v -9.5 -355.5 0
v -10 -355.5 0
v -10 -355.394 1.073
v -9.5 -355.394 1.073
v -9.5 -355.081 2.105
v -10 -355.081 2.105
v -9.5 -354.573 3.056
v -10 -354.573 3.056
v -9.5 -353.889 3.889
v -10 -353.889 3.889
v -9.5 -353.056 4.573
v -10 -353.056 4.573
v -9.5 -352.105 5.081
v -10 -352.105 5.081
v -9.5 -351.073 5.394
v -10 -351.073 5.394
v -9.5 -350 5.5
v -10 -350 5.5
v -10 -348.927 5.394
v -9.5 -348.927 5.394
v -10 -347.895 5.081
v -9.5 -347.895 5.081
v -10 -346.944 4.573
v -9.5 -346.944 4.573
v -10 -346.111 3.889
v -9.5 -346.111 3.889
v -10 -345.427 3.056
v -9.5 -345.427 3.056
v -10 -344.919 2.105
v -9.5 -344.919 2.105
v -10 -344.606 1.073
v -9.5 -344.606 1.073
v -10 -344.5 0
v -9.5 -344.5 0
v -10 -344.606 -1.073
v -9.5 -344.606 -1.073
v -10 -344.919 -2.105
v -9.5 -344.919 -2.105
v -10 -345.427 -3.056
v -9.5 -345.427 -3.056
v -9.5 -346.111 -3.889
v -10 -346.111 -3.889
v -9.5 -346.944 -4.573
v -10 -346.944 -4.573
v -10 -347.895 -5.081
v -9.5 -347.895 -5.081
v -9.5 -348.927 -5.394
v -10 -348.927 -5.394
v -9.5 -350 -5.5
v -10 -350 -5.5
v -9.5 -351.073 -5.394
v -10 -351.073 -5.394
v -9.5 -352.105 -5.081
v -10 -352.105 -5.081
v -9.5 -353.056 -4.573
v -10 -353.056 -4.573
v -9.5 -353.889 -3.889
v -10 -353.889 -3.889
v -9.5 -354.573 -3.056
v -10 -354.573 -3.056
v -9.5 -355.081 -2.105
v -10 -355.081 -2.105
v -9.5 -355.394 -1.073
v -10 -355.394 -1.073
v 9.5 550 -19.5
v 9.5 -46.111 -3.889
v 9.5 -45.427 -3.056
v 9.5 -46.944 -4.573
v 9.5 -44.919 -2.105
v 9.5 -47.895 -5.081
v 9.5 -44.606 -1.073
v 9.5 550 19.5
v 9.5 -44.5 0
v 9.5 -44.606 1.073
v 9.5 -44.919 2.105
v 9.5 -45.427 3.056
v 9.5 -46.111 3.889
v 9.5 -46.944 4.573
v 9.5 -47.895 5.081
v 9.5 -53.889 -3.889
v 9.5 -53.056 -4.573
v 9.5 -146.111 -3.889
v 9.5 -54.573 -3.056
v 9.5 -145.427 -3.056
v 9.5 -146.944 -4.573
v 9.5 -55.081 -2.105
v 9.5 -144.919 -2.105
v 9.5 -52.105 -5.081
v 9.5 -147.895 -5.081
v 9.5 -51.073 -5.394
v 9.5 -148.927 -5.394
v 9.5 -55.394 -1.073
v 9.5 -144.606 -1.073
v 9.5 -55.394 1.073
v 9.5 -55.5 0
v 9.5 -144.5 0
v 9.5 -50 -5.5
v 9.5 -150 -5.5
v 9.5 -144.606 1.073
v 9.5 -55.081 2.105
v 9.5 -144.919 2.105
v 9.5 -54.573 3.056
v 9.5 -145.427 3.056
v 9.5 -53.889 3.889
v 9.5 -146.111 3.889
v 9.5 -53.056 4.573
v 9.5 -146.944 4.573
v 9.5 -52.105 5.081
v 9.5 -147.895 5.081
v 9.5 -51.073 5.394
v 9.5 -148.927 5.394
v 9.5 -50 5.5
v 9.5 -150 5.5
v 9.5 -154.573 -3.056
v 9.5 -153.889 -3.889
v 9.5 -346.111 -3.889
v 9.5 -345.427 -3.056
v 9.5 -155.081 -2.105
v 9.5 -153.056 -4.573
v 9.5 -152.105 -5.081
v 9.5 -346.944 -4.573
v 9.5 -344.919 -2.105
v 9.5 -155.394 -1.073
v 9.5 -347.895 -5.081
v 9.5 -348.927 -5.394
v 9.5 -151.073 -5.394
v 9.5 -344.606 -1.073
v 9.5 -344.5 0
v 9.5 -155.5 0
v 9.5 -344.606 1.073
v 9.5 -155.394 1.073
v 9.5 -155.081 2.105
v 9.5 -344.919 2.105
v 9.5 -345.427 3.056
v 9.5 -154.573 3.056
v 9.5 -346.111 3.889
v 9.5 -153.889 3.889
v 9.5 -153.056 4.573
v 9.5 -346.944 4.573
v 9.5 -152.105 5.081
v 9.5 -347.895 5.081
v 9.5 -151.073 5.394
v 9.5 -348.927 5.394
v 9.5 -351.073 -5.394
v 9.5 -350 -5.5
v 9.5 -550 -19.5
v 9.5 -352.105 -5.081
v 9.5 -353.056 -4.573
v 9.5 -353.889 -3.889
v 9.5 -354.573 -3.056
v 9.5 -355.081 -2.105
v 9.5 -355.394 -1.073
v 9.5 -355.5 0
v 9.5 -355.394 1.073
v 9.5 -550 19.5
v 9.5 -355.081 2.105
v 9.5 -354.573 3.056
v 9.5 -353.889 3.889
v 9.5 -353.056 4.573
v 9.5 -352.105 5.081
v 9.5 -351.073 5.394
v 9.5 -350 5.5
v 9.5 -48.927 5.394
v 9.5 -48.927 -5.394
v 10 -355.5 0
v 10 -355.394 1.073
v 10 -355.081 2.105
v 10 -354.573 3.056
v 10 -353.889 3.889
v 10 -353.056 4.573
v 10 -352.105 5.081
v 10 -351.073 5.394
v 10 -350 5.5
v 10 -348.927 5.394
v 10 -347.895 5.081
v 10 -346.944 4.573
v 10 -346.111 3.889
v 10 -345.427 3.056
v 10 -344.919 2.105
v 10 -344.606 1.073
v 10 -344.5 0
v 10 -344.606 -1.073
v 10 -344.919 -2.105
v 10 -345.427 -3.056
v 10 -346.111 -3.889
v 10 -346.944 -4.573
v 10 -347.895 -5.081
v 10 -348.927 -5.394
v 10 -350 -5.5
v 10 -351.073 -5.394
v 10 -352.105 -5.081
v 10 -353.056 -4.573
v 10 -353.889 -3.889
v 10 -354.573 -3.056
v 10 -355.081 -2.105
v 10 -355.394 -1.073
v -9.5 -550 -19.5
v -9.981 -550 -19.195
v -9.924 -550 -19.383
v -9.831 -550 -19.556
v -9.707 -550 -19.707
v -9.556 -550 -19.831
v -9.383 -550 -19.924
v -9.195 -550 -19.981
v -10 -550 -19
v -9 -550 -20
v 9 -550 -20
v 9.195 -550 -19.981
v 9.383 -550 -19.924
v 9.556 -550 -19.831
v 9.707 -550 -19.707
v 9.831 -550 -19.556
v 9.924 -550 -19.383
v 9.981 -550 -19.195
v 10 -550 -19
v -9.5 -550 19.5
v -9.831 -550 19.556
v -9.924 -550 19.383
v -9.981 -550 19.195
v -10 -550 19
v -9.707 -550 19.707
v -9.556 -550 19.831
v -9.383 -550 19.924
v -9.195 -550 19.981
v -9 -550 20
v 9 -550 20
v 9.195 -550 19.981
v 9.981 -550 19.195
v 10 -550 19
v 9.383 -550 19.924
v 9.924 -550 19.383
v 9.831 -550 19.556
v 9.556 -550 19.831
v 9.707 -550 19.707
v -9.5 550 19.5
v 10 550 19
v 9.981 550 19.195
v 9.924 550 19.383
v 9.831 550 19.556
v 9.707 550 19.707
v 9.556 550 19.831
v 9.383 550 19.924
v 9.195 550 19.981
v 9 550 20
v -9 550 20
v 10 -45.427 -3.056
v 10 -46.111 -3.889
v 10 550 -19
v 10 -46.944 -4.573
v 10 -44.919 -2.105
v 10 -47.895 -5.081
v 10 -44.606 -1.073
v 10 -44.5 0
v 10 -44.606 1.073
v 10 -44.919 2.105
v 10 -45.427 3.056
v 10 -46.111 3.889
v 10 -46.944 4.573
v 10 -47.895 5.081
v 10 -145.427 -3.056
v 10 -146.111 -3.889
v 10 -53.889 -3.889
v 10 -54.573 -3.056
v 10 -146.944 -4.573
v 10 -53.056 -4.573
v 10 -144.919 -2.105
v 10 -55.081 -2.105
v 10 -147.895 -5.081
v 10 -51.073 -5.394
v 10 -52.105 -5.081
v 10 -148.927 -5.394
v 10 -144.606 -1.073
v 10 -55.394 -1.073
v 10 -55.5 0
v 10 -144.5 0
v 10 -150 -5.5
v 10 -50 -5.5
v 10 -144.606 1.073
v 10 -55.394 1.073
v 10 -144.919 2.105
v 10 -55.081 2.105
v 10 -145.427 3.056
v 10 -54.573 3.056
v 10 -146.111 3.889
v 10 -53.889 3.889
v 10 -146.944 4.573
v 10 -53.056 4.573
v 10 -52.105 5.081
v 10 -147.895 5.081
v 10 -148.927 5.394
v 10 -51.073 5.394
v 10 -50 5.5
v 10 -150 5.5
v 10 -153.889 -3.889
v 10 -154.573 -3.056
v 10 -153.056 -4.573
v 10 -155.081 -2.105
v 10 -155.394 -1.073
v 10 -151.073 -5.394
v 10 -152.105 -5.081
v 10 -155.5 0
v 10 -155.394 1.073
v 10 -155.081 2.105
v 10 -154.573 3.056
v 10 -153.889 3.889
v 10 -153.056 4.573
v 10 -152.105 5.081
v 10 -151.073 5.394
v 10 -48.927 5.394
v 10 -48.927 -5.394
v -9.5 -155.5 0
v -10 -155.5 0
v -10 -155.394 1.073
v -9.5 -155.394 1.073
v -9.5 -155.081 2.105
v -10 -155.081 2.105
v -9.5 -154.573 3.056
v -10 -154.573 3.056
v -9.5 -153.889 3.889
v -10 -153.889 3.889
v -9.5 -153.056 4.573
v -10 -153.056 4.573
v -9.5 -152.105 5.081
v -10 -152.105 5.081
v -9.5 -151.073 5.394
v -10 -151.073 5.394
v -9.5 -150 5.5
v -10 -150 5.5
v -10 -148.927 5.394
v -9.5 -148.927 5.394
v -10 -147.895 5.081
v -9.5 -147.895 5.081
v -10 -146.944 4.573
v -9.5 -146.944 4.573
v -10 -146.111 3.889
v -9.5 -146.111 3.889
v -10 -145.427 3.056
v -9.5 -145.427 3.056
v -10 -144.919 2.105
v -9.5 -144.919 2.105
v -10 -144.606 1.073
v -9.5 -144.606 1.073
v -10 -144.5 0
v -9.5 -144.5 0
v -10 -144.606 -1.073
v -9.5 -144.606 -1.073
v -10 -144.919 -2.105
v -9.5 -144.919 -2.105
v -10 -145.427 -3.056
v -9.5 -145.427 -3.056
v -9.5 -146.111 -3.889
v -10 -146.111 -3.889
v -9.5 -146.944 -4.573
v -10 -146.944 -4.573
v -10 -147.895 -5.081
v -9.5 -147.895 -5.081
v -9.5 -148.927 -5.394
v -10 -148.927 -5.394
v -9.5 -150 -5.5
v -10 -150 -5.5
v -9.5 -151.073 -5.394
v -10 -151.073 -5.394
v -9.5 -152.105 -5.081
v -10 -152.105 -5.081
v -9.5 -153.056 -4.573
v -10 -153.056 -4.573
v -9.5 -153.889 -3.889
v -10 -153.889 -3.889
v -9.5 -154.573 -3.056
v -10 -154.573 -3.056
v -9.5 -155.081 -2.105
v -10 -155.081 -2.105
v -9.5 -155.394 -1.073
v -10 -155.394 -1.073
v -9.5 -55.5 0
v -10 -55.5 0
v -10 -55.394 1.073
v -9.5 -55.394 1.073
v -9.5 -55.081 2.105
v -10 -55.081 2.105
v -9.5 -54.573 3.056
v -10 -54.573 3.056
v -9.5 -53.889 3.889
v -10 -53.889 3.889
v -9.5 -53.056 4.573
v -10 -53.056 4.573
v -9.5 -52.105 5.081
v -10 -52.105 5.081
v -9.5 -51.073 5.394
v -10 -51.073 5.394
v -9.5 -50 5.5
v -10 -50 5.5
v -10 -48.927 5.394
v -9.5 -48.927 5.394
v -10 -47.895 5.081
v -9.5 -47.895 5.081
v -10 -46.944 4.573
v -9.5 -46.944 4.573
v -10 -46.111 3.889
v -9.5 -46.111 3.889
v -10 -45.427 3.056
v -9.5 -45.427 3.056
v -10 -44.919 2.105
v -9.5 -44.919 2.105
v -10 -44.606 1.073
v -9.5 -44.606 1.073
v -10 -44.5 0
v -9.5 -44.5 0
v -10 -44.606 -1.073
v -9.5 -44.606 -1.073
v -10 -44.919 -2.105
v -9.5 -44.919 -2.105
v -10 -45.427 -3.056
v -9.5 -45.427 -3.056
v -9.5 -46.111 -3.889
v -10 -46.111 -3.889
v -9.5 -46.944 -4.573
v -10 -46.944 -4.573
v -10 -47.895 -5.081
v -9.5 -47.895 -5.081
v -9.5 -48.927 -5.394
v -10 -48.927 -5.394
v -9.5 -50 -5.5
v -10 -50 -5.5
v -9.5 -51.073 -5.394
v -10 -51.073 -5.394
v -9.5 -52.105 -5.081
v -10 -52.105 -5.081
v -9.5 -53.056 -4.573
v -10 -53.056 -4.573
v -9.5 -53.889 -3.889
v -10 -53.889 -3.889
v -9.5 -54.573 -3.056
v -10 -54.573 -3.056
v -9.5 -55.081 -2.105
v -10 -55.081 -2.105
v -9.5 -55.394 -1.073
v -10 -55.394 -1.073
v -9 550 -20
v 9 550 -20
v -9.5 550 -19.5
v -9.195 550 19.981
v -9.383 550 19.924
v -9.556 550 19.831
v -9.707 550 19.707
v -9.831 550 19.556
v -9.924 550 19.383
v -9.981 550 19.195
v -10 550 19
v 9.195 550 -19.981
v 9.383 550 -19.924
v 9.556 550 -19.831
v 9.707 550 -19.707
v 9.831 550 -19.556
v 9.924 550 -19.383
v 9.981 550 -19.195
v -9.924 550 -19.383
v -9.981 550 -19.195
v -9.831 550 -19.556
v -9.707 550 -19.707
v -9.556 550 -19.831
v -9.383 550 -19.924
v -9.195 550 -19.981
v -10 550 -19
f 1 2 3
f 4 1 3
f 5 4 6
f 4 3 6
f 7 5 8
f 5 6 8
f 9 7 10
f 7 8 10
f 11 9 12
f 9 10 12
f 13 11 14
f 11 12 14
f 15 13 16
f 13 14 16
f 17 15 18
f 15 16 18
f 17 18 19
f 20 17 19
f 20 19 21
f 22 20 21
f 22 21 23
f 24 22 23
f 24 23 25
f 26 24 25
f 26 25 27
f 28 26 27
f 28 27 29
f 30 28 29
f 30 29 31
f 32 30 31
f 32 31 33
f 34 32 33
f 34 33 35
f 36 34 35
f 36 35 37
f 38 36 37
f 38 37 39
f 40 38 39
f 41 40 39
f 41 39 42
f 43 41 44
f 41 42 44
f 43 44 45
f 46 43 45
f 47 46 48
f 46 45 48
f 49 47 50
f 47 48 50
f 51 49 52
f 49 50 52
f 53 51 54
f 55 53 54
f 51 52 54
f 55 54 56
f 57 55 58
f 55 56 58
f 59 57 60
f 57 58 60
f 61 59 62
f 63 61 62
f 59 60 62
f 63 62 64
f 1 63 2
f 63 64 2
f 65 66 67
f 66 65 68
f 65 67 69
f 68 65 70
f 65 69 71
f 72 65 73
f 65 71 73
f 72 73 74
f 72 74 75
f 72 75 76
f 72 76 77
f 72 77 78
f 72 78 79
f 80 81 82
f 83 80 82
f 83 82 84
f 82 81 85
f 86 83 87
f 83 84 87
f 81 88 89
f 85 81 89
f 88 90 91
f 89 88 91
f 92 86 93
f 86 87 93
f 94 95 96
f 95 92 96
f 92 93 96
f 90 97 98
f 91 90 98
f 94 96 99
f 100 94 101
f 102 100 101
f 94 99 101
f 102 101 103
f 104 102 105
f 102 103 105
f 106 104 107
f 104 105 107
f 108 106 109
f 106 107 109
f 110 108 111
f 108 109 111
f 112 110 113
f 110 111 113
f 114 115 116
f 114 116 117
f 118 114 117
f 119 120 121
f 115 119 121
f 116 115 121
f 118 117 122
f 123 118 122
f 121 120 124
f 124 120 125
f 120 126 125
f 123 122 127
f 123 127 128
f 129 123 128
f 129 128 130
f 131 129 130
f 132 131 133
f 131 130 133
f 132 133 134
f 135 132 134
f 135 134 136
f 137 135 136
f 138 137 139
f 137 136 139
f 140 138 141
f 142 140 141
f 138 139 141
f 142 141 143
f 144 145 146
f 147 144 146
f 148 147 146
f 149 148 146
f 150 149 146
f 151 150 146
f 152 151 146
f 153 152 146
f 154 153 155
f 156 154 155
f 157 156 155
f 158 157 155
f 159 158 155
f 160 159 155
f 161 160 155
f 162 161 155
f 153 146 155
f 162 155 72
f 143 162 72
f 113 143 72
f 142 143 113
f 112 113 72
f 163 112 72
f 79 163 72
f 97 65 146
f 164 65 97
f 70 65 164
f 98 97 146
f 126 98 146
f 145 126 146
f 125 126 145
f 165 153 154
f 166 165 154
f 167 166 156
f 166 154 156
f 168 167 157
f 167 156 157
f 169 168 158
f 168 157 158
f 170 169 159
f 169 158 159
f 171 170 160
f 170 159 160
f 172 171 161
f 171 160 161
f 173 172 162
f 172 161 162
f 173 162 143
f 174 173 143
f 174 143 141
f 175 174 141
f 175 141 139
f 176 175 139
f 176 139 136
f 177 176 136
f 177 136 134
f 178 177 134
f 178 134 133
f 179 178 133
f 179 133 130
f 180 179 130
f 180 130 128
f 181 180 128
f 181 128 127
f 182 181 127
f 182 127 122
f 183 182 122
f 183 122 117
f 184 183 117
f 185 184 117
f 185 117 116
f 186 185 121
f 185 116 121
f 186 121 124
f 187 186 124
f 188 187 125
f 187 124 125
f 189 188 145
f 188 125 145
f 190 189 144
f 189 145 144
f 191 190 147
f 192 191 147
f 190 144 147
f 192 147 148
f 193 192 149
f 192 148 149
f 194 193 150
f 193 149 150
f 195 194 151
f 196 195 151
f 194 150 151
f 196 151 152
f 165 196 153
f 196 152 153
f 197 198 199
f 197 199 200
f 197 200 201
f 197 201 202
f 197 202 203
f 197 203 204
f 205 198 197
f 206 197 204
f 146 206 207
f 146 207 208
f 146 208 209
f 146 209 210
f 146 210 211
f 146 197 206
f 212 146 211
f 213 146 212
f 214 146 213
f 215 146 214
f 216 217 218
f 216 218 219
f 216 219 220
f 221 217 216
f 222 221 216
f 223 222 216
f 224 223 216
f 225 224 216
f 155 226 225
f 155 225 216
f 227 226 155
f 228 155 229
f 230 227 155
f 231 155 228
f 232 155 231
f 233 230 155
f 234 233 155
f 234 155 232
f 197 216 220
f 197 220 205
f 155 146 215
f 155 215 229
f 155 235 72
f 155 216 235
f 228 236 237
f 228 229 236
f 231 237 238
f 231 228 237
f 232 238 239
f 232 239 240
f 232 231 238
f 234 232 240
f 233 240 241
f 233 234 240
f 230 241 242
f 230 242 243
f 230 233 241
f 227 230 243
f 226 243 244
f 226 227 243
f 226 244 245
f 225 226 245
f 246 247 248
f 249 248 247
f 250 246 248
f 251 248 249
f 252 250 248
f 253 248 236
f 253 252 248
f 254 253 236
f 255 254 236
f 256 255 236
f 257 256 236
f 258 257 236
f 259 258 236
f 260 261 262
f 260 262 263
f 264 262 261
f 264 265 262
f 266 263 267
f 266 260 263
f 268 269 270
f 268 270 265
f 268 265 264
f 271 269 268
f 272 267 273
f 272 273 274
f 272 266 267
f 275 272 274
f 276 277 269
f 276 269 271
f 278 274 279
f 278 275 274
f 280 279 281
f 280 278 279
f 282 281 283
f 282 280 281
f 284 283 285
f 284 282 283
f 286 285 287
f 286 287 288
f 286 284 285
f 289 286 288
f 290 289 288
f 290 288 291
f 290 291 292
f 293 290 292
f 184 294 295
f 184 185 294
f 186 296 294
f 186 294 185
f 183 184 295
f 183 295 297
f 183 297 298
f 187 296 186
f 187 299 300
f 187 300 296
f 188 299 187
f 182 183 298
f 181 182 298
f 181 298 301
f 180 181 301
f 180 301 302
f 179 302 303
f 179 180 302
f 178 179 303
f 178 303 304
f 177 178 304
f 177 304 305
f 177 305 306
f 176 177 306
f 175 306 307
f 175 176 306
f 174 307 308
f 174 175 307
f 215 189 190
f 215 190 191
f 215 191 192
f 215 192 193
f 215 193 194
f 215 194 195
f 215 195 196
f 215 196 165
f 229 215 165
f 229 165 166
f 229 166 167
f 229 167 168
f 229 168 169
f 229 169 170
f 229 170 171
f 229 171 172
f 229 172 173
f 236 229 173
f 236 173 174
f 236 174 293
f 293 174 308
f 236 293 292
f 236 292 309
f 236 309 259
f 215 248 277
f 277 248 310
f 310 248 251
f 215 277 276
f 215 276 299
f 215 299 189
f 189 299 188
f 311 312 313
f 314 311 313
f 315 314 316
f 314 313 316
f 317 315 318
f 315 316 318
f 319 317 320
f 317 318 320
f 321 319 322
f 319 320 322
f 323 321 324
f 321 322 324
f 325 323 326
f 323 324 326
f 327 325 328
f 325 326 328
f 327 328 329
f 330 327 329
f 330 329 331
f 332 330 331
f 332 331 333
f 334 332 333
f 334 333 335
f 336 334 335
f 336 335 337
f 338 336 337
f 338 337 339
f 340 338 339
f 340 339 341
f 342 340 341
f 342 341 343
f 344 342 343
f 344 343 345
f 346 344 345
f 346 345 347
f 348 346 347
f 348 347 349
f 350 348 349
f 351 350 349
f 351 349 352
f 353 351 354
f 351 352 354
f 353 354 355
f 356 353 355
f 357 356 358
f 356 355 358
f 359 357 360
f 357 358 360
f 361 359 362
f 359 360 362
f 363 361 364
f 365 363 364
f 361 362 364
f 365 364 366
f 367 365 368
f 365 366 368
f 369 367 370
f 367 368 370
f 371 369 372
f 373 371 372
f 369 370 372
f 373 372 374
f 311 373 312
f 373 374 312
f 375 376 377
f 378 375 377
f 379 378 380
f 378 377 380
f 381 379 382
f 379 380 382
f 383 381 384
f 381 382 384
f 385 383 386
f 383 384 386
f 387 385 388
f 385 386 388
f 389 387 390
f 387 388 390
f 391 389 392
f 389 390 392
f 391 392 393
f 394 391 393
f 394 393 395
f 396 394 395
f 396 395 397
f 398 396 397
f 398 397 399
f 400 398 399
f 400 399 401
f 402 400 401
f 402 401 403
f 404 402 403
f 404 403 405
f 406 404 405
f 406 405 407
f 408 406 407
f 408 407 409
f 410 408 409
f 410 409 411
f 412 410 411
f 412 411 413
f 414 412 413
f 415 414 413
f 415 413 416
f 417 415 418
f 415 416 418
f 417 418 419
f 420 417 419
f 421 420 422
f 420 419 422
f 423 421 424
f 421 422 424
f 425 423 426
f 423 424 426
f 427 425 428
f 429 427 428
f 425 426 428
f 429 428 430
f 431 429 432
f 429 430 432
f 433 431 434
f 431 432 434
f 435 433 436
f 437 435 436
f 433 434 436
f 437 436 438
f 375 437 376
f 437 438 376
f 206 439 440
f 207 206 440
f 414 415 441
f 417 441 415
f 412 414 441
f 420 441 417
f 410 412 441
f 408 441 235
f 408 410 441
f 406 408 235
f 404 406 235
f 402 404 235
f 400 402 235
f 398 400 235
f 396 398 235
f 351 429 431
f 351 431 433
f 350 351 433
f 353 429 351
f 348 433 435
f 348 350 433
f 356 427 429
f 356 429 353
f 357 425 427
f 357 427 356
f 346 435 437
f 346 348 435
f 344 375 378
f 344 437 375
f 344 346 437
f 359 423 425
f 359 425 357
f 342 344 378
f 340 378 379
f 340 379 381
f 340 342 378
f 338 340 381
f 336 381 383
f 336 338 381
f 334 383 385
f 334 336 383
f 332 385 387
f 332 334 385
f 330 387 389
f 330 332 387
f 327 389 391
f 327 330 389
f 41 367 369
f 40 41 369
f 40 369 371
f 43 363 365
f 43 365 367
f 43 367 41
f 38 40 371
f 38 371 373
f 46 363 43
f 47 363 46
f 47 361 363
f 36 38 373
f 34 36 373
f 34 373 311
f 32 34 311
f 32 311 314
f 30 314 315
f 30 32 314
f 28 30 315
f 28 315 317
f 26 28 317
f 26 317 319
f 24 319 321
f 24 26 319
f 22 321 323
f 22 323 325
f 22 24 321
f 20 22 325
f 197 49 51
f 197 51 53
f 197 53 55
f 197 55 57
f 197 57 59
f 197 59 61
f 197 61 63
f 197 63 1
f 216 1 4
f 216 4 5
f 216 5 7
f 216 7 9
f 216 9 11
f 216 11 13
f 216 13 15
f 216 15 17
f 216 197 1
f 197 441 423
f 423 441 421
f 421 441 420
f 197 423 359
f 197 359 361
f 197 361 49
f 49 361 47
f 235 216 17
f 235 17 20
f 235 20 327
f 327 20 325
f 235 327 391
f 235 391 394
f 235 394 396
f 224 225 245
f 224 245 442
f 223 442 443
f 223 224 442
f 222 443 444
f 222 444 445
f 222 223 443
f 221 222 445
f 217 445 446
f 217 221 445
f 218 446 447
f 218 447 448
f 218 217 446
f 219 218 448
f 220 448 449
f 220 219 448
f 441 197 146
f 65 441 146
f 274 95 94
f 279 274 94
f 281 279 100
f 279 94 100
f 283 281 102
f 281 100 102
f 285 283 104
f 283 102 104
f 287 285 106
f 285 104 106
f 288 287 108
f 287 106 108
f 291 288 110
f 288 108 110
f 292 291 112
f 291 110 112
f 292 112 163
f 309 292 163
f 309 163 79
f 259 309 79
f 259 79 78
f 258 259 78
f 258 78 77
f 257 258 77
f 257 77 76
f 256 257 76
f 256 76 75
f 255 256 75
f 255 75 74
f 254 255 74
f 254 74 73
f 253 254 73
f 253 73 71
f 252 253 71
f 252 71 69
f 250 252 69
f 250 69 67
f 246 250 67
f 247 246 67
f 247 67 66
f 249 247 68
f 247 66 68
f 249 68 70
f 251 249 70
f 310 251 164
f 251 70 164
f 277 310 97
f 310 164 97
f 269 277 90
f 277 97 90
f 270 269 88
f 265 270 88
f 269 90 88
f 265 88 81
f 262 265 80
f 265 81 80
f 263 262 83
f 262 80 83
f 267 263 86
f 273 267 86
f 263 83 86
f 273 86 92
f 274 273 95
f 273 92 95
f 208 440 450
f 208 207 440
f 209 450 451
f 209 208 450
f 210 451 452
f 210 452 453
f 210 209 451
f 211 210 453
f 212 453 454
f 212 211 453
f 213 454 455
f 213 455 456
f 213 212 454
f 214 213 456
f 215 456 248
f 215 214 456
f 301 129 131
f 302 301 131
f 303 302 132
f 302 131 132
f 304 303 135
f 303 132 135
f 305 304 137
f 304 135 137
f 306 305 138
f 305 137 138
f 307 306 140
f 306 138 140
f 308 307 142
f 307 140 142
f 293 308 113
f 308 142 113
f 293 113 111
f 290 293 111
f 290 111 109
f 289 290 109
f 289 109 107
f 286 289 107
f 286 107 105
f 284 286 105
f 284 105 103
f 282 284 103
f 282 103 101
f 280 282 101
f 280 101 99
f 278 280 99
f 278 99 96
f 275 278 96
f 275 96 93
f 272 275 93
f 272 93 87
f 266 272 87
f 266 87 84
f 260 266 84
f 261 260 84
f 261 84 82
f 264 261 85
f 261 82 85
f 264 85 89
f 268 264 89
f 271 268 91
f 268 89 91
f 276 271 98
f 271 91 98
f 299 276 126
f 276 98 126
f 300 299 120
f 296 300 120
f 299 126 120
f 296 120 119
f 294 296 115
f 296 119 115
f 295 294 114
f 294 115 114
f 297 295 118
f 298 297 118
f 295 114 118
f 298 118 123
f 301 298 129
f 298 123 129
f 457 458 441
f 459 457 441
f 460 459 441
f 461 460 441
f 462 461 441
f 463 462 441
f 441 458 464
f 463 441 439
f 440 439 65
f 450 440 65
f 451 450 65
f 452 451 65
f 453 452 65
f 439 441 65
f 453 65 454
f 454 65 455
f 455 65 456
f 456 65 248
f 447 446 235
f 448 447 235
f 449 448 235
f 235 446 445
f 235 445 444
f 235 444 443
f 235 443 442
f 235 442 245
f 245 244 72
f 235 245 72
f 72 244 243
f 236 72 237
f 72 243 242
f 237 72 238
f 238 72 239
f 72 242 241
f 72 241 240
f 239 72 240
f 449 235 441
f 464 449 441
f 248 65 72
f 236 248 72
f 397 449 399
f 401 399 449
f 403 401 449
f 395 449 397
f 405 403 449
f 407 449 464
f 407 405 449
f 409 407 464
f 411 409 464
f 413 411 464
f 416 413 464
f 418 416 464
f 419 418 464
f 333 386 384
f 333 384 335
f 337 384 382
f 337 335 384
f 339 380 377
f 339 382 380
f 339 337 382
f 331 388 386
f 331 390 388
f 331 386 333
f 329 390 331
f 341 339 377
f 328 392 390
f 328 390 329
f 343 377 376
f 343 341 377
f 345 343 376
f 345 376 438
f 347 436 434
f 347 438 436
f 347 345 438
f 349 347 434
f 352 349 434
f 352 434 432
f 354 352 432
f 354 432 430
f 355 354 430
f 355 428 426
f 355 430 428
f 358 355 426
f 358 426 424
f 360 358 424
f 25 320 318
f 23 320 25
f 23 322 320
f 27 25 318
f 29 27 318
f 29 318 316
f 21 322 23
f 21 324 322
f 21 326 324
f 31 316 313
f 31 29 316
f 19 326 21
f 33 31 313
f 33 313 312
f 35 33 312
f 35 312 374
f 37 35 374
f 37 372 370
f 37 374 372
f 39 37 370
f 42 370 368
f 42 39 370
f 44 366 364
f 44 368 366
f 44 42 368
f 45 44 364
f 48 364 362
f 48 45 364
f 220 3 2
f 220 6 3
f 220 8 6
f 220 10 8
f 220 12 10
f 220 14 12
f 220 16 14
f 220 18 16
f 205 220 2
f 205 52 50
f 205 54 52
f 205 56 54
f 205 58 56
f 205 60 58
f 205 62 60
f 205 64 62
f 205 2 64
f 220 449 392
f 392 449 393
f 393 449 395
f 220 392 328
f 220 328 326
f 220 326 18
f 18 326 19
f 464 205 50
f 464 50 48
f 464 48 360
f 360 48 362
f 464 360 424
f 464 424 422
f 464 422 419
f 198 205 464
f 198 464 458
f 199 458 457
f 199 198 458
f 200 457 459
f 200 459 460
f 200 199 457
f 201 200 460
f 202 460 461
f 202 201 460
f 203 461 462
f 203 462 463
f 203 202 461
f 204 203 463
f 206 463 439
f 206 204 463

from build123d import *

# Parameters (mm, degrees)
F0_W     = 19
F0_H     = 39
F1_DEPTH = 550
F3_D     = 11
F3_DEPTH = 30
F3_TIP   = 3.3047334047


# Not quite as in the source:
# - a feature names something its author has since deleted; it is built from what else it names


with BuildPart() as f1:
    # F0 (on Front) → F1 (new body, symmetric)
    with BuildSketch(Plane.XZ):
        with BuildLine():
            Line((9, 20), (-9, 20))
            ThreePointArc((-9, 20), (-9.7071067812, 19.7071067812), (-10, 19))
            Line((-10, 19), (-10, -19))
            ThreePointArc((-10, -19), (-9.7071067812, -19.7071067812), (-9, -20))
            Line((-9, -20), (9, -20))
            ThreePointArc((9, -20), (9.7071067812, -19.7071067812), (10, -19))
            Line((10, -19), (10, 19))
            ThreePointArc((10, 19), (9.7071067812, 19.7071067812), (9, 20))
        make_face()
        Rectangle(F0_W, F0_H, mode=Mode.SUBTRACT)
    extrude(amount=F1_DEPTH, both=True)

    # F3
    with Locations(Plane.YZ.offset(10)):
        with Locations((-50, 0), (-150, 0), (-350, 0)):
            Hole(F3_D / 2, depth=F3_DEPTH)
            with Locations((0, 0, -(F3_DEPTH + F3_TIP / 2))):  # 118° drill point
                Cone(0, F3_D / 2, F3_TIP, mode=Mode.SUBTRACT)


solid = f1.part
